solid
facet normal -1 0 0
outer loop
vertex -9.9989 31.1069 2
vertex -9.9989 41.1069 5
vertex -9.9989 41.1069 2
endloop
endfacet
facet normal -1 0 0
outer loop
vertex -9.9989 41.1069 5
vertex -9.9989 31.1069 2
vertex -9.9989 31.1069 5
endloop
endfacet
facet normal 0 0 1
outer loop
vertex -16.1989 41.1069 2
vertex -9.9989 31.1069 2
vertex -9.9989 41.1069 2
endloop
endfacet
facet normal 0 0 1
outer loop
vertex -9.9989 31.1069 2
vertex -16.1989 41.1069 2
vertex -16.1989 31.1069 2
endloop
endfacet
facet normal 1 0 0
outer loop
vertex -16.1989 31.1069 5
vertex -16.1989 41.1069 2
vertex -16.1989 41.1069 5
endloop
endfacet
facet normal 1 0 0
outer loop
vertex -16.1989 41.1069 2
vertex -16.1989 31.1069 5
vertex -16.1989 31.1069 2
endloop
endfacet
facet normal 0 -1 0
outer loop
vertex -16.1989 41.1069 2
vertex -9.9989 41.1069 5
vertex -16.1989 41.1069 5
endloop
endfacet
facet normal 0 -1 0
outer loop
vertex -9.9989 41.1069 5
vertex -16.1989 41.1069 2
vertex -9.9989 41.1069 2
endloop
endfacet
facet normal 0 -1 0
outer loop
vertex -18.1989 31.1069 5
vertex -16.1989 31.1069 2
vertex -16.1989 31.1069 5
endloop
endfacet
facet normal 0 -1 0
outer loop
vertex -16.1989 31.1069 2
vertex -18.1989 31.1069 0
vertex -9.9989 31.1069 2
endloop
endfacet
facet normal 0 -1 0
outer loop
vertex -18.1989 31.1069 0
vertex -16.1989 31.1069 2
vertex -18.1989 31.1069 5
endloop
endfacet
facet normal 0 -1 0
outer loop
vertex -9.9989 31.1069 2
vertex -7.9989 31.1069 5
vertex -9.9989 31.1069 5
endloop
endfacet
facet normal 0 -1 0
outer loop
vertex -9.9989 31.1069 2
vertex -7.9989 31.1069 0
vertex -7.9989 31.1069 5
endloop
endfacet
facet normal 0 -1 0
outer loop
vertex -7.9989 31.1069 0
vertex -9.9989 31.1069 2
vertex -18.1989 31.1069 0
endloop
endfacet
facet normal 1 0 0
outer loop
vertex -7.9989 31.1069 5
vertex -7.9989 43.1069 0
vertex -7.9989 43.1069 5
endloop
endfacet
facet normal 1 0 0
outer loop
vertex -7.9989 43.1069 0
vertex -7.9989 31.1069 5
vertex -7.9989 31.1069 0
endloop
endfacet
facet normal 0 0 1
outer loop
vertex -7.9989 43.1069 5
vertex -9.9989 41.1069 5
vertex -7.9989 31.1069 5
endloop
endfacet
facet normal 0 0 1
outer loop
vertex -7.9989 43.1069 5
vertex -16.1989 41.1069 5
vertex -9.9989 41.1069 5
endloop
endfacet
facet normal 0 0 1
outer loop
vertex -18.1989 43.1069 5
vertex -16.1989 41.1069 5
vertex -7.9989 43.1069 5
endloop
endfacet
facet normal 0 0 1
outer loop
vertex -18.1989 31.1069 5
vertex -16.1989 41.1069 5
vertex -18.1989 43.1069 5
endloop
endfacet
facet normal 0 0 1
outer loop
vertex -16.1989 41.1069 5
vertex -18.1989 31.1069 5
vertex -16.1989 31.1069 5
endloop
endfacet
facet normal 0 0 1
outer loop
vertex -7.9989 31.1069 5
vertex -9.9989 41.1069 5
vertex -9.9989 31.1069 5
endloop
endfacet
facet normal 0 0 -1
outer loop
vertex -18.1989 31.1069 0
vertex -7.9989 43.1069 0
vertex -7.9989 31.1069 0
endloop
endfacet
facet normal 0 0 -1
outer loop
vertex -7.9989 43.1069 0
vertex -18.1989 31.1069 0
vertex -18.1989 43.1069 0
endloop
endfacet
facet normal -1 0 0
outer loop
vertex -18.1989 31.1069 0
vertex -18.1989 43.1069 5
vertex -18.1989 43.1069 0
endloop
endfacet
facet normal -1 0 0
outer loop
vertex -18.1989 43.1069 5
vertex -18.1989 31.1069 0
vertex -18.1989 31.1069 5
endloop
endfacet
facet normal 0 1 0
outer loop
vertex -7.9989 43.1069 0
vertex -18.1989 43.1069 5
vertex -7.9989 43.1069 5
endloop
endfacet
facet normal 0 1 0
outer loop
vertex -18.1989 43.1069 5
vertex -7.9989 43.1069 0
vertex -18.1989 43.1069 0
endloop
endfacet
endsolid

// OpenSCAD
difference () {
  union () {
    translate ([-13.098885519041218, 37.106924587896565, 5/2]) {
      cube ([10.2, 12, 5], center=true);
    }
  }
  union () {
    translate ([-13.098885519041218, 43.106924587896565, 8.555555555555555]) {
      rotate (a=90.0, v=[1, 0, 0]) {
        cylinder ($fn=30, h=20, r=3.3, center=true);
      }
    }
    translate ([-13.098885519041218, 36.106924587896565, 5]) {
      cube ([6.2, 10, 6], center=true);
    }
  }
}
